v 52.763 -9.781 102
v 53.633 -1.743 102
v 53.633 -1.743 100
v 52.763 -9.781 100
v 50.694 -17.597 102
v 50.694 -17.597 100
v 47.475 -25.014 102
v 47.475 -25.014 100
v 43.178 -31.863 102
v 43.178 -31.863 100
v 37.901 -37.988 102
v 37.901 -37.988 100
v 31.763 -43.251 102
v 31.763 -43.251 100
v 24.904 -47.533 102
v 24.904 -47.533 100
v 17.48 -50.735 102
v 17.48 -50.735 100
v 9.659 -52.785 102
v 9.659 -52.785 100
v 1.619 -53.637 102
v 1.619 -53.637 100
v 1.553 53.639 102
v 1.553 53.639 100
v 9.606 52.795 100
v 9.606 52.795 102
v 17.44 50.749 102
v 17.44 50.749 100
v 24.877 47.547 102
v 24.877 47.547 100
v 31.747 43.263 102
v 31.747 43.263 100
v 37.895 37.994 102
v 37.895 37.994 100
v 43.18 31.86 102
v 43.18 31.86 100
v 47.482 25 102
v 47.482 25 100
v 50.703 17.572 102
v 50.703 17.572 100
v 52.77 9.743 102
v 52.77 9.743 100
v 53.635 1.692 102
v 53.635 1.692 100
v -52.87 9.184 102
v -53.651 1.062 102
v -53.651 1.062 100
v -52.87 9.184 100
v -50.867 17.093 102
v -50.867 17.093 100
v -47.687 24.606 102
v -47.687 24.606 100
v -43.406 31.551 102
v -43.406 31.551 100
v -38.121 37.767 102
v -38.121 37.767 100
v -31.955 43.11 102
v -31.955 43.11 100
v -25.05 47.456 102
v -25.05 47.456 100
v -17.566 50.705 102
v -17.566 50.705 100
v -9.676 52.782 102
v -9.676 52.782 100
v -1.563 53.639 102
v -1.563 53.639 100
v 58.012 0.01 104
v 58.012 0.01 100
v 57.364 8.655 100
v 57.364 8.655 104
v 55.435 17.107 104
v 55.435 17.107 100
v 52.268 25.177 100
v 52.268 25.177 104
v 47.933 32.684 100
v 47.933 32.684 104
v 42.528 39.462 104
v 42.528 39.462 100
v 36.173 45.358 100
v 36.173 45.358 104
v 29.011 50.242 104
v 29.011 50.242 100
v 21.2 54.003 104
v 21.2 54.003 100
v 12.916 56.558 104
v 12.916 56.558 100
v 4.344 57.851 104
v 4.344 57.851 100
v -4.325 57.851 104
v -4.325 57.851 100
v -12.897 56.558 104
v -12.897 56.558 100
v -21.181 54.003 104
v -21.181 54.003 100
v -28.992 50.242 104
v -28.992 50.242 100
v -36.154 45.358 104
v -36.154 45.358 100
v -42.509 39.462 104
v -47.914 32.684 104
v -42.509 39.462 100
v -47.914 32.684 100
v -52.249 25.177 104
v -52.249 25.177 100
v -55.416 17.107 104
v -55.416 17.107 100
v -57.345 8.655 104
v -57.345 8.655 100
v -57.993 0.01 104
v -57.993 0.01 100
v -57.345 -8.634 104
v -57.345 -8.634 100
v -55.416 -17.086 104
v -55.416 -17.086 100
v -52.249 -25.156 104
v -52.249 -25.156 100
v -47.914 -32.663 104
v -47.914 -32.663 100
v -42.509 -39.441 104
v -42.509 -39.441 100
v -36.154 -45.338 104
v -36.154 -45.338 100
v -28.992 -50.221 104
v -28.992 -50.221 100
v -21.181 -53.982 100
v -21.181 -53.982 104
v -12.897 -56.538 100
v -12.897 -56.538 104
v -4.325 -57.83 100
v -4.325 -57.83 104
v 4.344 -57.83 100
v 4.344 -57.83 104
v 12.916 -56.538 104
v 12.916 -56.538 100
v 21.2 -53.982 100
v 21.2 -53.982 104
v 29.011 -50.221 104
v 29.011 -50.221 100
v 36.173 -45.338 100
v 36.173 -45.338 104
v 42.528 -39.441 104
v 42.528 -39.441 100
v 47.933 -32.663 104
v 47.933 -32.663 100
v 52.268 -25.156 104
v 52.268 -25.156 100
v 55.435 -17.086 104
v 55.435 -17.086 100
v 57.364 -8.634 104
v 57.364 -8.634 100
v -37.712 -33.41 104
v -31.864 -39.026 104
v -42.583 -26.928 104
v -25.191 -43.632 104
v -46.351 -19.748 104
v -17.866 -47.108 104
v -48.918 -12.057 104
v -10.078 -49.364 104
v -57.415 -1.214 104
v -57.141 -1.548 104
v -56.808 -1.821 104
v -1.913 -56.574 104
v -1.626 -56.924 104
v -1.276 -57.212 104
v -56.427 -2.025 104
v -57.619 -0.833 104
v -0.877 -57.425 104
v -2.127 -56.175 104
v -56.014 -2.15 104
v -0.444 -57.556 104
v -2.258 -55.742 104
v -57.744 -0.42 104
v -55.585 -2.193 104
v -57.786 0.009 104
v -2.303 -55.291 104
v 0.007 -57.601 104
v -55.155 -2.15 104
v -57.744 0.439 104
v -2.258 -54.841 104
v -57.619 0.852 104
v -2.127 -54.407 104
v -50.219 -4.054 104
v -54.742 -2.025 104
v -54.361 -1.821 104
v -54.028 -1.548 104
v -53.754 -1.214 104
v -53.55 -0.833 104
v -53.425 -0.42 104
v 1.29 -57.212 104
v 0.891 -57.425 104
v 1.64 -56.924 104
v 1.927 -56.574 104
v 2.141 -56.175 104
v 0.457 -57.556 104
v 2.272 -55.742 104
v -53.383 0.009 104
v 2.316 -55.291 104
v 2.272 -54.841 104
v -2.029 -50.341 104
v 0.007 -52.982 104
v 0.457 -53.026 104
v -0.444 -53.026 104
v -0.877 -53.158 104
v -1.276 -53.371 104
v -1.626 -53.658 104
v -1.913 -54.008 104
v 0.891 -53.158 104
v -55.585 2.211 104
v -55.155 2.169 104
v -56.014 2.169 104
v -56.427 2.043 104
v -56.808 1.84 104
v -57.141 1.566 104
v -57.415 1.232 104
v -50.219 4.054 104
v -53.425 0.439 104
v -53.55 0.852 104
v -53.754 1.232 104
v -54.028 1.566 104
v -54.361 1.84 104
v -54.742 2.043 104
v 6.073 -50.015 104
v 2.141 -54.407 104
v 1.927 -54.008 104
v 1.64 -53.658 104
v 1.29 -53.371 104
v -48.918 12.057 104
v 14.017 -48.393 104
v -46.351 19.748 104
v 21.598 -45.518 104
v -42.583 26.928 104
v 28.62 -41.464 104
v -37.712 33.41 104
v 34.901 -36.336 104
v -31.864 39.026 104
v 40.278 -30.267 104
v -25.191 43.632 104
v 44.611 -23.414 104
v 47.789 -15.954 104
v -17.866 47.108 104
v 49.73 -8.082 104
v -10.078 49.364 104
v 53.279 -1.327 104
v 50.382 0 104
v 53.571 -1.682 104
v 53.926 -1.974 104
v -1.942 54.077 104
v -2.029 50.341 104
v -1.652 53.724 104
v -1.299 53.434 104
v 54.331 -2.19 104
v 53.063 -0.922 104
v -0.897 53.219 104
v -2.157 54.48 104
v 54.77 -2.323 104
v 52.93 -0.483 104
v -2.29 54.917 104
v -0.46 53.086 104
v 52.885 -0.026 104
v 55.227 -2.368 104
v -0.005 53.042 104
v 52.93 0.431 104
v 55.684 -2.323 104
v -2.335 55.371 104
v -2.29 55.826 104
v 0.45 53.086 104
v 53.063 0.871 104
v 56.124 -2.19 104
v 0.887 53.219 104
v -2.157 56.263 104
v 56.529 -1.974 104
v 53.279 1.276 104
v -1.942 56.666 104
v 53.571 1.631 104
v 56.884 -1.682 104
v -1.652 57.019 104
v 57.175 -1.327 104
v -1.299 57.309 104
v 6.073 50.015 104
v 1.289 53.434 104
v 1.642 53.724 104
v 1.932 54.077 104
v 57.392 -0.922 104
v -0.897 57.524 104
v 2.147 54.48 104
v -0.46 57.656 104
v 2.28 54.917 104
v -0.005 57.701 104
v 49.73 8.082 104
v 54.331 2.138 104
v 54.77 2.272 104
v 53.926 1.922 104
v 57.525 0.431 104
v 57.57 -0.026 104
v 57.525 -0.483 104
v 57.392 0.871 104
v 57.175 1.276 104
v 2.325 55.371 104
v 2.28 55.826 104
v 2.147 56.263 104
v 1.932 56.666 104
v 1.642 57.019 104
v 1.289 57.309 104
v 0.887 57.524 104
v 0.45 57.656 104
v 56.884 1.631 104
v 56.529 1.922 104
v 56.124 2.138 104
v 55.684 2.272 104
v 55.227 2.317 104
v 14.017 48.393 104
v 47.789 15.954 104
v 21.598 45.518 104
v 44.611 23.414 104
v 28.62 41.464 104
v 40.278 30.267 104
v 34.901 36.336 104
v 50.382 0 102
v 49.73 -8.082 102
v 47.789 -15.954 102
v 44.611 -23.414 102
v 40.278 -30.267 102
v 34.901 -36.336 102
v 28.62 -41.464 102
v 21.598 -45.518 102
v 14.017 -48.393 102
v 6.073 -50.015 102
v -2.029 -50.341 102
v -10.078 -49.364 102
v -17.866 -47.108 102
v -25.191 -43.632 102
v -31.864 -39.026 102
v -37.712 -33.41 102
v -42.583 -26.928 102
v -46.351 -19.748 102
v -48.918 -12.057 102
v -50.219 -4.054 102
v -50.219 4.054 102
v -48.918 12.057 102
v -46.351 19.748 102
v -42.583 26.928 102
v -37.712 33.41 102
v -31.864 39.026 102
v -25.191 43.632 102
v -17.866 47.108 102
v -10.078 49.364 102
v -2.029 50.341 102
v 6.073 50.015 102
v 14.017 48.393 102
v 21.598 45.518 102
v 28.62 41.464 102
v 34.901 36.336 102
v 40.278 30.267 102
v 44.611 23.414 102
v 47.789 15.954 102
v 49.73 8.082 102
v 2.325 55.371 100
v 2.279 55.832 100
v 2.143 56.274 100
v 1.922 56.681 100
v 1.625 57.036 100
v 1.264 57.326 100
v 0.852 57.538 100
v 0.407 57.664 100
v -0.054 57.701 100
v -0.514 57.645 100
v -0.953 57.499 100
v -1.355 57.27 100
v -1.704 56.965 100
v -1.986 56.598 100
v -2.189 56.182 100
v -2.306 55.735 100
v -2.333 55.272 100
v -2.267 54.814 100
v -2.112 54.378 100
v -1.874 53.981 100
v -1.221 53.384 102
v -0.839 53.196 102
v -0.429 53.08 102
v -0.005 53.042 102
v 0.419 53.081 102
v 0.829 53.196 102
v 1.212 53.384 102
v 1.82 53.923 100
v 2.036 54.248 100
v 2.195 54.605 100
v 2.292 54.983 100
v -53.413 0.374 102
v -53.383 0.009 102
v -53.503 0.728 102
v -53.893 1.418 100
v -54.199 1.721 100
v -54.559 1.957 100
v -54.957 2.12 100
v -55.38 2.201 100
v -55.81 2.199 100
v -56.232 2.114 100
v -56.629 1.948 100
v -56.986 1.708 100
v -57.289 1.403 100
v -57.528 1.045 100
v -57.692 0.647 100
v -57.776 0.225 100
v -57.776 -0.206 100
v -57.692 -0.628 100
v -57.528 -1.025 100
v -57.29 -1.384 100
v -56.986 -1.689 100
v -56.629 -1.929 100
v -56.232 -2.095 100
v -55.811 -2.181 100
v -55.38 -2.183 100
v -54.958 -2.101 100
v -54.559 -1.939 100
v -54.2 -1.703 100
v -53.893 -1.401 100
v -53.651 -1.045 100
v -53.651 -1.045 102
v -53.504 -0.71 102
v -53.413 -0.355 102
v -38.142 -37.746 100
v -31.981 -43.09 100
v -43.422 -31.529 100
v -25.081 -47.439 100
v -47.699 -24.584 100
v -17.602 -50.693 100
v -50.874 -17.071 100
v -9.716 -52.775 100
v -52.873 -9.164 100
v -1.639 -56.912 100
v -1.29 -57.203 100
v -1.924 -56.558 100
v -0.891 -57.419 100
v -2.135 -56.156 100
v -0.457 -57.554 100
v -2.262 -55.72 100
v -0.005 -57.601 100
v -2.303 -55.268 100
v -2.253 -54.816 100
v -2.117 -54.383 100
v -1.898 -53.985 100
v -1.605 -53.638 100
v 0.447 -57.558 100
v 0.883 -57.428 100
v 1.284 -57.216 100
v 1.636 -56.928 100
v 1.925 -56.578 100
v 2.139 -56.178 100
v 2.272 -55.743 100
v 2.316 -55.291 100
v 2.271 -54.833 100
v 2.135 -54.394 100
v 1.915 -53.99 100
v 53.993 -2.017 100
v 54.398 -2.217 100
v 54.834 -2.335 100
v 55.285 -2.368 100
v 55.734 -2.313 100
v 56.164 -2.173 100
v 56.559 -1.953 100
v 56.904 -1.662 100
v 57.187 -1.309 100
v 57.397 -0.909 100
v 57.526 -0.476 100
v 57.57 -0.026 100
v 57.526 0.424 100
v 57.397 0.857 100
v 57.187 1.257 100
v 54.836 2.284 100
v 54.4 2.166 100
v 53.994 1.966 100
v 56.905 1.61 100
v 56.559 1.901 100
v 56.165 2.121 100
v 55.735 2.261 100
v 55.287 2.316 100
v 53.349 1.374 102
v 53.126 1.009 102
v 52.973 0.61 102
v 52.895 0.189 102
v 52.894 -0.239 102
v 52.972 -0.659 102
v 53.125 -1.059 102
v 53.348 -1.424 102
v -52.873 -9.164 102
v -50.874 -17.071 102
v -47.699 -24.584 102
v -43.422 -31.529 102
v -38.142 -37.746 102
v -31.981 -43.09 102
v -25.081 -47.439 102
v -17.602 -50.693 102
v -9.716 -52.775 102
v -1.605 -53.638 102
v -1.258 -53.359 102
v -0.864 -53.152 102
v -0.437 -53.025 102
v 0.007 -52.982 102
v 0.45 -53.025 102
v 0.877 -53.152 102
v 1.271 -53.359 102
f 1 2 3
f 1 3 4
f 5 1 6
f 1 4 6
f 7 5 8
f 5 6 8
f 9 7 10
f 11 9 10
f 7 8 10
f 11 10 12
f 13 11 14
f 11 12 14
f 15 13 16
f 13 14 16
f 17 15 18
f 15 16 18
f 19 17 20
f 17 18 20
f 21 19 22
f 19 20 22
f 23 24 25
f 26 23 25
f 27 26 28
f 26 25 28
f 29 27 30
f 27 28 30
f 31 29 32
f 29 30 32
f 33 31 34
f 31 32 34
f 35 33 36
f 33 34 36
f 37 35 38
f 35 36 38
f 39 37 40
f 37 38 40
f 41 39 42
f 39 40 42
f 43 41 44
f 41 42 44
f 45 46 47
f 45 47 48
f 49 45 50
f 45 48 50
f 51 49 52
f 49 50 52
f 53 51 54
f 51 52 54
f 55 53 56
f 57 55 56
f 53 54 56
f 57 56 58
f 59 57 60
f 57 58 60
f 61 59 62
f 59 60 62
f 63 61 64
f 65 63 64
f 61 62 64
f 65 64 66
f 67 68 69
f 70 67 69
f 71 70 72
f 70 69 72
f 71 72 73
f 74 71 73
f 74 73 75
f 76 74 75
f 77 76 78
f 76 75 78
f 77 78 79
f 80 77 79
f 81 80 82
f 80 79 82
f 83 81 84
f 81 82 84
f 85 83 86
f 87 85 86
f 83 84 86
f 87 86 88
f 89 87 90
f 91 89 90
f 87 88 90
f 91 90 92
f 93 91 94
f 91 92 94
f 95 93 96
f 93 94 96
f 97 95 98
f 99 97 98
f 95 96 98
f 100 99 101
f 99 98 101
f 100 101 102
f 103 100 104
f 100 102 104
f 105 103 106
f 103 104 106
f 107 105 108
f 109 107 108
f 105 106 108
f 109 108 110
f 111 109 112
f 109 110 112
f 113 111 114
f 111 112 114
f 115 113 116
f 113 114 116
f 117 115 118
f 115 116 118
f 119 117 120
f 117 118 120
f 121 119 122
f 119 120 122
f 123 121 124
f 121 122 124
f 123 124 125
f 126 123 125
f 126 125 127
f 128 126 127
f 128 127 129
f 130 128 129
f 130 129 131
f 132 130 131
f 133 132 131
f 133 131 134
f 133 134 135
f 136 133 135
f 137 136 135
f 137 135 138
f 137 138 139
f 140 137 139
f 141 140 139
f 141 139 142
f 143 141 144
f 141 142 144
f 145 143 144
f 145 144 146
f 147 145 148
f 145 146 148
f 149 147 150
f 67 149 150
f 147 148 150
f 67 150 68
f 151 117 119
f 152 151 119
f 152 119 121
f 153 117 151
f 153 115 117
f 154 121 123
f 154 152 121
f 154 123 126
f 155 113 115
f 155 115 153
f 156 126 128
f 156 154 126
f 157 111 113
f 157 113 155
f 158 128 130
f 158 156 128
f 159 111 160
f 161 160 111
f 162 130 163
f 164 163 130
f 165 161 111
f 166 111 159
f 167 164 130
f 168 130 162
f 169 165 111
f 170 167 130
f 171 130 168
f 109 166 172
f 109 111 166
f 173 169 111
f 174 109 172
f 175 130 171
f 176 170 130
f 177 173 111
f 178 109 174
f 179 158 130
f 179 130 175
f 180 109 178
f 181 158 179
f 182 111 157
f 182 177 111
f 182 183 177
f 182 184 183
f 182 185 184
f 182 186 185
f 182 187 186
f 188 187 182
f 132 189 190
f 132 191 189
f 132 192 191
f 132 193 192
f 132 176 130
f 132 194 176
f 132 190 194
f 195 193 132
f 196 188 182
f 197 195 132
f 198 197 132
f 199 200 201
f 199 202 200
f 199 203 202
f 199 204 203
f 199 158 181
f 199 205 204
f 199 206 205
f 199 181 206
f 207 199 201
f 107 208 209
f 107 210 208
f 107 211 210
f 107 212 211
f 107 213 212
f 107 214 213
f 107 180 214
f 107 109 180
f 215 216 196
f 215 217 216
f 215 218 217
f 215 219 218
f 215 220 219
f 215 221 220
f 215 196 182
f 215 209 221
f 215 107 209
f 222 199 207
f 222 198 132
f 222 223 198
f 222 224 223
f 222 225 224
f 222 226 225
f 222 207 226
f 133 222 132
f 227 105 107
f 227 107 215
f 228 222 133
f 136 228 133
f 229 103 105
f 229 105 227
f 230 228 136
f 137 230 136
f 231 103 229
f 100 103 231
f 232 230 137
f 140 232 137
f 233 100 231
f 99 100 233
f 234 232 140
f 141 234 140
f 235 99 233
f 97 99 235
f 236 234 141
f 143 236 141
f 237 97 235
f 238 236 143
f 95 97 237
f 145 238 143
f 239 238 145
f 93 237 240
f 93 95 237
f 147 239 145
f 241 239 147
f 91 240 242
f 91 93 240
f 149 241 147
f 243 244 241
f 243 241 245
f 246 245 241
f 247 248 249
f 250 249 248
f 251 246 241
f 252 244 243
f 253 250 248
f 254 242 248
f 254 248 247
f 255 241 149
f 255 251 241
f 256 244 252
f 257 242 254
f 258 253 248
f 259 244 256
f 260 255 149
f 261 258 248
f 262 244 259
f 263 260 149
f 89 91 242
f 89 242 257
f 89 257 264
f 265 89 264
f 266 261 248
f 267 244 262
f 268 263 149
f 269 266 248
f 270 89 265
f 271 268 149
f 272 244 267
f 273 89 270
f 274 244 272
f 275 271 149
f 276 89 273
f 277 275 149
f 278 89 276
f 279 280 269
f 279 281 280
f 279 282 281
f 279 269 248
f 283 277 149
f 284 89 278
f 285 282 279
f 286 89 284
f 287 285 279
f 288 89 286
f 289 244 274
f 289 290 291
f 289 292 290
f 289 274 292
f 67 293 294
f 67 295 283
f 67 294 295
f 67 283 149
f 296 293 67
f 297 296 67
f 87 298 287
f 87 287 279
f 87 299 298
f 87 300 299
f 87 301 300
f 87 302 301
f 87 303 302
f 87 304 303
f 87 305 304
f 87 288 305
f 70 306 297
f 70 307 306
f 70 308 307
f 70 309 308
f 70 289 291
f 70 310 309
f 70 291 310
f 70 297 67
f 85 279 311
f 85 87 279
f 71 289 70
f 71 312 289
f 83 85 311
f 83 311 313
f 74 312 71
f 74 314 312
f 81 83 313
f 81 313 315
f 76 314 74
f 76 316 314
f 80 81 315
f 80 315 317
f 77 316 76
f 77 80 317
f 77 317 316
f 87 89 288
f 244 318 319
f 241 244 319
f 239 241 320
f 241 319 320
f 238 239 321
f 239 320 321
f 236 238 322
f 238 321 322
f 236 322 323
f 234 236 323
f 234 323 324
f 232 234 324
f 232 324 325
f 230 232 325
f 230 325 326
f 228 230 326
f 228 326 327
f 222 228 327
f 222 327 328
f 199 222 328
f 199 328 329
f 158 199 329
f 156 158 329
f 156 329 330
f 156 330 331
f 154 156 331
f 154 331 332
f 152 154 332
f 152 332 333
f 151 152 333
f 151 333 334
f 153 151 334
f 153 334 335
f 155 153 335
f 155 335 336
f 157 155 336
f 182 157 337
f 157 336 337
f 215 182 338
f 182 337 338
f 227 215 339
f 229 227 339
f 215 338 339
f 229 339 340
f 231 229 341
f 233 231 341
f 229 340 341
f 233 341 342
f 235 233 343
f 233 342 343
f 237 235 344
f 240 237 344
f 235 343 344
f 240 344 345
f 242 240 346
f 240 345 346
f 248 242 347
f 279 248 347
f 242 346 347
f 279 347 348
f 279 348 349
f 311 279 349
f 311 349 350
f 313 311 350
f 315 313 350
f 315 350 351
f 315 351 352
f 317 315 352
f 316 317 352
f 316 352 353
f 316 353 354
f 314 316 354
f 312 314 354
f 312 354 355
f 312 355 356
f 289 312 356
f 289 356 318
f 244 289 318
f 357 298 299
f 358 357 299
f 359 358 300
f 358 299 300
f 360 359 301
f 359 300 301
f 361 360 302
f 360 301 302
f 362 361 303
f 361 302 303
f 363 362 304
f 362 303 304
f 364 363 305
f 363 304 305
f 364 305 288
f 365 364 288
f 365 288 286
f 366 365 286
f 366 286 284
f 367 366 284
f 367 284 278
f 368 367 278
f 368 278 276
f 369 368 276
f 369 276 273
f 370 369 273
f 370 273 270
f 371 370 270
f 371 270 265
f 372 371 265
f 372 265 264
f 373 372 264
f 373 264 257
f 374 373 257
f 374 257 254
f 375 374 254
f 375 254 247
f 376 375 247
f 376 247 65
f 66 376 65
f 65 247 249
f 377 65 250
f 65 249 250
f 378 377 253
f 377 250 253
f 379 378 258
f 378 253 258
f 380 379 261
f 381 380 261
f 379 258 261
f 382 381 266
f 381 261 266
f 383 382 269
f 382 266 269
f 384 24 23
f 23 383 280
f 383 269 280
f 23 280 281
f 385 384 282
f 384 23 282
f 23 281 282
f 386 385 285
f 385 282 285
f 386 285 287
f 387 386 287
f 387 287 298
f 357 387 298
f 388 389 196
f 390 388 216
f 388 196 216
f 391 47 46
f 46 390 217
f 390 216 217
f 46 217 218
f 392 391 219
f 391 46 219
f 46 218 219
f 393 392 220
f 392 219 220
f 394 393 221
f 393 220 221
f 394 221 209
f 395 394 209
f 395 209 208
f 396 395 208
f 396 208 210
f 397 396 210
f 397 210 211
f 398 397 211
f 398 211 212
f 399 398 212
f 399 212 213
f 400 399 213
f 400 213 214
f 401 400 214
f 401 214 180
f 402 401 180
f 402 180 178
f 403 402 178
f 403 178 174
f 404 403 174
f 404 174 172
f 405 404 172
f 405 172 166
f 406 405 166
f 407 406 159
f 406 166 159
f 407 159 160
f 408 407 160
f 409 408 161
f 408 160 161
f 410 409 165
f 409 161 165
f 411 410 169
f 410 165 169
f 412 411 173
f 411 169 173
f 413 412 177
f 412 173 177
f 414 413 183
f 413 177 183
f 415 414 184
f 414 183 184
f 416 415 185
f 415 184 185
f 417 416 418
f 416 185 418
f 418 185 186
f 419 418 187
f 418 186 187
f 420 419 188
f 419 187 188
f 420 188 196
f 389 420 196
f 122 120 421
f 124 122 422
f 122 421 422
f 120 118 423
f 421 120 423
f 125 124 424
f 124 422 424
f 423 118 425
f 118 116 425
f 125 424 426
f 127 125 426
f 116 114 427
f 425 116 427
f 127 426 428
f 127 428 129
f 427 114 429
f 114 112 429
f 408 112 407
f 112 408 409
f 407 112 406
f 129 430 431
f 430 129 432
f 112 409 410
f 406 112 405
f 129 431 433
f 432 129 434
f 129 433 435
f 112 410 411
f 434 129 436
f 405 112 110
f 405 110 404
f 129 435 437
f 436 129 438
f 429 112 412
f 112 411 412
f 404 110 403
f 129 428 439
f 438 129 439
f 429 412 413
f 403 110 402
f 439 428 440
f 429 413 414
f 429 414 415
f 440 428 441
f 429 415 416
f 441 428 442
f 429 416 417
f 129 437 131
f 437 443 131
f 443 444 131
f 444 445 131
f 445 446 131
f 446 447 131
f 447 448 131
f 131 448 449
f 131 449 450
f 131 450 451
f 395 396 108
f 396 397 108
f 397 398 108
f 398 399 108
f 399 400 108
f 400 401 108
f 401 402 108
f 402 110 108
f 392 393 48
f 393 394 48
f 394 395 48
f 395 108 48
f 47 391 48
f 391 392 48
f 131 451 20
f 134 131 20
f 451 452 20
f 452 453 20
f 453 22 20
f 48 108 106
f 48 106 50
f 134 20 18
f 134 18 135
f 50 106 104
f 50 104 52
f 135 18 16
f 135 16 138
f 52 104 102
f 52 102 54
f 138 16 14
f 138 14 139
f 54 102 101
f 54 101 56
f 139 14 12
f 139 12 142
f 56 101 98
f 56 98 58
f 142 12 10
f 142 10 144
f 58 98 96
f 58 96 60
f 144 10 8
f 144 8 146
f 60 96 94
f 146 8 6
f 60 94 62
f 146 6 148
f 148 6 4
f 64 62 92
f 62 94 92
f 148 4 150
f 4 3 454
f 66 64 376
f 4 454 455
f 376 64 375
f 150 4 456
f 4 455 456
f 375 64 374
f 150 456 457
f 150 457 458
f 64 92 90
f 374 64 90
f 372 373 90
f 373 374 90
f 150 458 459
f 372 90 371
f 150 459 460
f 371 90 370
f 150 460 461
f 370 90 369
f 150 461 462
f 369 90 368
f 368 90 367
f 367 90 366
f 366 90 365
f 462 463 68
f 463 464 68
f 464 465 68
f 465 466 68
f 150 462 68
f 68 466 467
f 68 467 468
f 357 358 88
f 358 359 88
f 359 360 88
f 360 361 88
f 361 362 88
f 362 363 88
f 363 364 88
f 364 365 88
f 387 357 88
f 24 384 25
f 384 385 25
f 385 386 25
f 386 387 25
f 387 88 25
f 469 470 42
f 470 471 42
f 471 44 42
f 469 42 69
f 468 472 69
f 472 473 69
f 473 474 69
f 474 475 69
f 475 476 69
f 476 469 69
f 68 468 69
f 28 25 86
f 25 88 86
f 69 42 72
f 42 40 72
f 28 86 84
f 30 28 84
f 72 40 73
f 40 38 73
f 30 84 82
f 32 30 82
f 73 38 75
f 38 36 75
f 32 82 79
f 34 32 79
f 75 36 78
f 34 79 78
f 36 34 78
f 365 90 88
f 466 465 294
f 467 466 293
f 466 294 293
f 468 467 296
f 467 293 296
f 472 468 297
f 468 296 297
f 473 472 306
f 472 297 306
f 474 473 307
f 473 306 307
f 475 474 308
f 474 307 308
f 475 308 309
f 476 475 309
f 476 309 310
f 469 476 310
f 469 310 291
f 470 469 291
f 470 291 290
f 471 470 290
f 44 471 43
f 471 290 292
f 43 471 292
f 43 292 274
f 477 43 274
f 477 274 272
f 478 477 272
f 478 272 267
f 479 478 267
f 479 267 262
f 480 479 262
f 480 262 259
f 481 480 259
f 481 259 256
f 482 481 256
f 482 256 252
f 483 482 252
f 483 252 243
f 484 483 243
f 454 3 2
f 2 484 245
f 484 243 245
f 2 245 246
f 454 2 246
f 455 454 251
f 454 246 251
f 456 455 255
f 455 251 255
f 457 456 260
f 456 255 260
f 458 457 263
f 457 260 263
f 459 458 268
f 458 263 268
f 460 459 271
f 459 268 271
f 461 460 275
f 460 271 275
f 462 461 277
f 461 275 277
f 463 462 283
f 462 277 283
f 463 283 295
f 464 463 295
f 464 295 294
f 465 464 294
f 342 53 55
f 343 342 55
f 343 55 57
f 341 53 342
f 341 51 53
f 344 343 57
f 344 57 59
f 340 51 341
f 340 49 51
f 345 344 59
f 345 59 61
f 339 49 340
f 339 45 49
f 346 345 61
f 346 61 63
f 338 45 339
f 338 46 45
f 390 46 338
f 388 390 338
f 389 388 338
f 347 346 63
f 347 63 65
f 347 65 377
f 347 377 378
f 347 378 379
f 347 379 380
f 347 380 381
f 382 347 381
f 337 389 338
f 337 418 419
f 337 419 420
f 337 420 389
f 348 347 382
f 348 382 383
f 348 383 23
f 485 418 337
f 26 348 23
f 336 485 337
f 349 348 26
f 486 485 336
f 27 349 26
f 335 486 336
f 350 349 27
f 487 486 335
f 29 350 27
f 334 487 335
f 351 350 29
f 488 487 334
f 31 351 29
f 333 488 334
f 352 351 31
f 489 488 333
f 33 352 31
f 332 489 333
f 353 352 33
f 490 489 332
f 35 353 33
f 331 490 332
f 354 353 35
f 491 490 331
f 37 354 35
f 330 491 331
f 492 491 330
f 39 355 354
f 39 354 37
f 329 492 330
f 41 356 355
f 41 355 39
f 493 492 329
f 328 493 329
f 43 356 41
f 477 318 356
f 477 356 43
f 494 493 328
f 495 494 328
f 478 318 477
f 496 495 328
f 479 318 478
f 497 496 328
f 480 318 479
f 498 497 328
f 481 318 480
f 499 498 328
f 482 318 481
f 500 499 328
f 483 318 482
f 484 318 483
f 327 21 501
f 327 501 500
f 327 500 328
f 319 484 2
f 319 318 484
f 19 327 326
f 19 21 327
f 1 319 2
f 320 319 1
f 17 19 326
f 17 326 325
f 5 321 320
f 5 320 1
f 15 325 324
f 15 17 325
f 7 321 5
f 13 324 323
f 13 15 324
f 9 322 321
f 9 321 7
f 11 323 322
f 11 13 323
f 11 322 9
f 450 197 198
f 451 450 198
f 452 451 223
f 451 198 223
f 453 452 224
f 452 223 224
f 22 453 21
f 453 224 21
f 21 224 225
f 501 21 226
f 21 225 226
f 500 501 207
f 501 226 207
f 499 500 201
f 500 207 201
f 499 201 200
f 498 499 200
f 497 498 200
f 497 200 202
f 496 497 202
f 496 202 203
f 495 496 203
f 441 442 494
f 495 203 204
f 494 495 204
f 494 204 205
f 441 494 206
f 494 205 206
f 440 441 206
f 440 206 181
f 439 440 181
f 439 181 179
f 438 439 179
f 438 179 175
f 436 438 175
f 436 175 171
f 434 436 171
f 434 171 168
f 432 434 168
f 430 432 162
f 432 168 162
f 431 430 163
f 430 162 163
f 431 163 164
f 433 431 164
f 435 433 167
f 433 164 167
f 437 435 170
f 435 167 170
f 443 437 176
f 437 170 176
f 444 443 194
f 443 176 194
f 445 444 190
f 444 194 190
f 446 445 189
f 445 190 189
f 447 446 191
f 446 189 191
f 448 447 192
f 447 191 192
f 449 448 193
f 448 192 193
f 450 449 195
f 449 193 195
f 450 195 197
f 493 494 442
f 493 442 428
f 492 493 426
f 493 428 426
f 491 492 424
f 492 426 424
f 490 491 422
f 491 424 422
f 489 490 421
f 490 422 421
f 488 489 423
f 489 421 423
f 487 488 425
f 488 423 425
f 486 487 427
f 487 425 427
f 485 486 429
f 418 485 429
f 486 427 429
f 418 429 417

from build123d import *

# Parameters (mm, degrees)
SKETCH016_R     = 58.002282
PAD003_DEPTH    = 4
SKETCH017_R     = 53.661605
POCKET009_DEPTH = 2
SKETCH018_R     = 50.382199
POCKET010_DEPTH = 10
SKETCH019_R     = 2.342621
SKETCH019_R_2   = 2.309522
SKETCH019_R_3   = 2.201756
SKETCH019_R_4   = 2.329825
POCKET011_DEPTH = 5


with BuildPart() as part:
    # Sketch016 → Pad003 (new body)
    with BuildSketch(Plane.XY.offset(100)):
        with Locations((0.009453, 0.01044)):
            Circle(SKETCH016_R)
    extrude(amount=PAD003_DEPTH)

    # Sketch017 → Pocket009 (cut)
    with BuildSketch(Plane(origin=(0, 0, 100), x_dir=(1, 0, 0), z_dir=(0, 0, -1))):
        Circle(SKETCH017_R)
    extrude(amount=-POCKET009_DEPTH, mode=Mode.SUBTRACT)

    # Sketch018 → Pocket010 (cut)
    with BuildSketch(Plane(origin=(0, 0, 102), x_dir=(1, 0, 0), z_dir=(0, 0, -1))):
        Circle(SKETCH018_R)
    extrude(amount=-POCKET010_DEPTH, mode=Mode.SUBTRACT)

    # Sketch019 → Pocket011 (cut)
    with BuildSketch(Plane.XY.offset(104)):
        with Locations((55.227253, -0.025824)):
            Circle(SKETCH019_R)
        with Locations((0.006845, -55.291275)):
            Circle(SKETCH019_R_2)
        with Locations((-55.584568, 0.009231)):
            Circle(SKETCH019_R_3)
        with Locations((-0.004998, 55.371342)):
            Circle(SKETCH019_R_4)
    extrude(amount=-POCKET011_DEPTH, mode=Mode.SUBTRACT)


solid = part.part
